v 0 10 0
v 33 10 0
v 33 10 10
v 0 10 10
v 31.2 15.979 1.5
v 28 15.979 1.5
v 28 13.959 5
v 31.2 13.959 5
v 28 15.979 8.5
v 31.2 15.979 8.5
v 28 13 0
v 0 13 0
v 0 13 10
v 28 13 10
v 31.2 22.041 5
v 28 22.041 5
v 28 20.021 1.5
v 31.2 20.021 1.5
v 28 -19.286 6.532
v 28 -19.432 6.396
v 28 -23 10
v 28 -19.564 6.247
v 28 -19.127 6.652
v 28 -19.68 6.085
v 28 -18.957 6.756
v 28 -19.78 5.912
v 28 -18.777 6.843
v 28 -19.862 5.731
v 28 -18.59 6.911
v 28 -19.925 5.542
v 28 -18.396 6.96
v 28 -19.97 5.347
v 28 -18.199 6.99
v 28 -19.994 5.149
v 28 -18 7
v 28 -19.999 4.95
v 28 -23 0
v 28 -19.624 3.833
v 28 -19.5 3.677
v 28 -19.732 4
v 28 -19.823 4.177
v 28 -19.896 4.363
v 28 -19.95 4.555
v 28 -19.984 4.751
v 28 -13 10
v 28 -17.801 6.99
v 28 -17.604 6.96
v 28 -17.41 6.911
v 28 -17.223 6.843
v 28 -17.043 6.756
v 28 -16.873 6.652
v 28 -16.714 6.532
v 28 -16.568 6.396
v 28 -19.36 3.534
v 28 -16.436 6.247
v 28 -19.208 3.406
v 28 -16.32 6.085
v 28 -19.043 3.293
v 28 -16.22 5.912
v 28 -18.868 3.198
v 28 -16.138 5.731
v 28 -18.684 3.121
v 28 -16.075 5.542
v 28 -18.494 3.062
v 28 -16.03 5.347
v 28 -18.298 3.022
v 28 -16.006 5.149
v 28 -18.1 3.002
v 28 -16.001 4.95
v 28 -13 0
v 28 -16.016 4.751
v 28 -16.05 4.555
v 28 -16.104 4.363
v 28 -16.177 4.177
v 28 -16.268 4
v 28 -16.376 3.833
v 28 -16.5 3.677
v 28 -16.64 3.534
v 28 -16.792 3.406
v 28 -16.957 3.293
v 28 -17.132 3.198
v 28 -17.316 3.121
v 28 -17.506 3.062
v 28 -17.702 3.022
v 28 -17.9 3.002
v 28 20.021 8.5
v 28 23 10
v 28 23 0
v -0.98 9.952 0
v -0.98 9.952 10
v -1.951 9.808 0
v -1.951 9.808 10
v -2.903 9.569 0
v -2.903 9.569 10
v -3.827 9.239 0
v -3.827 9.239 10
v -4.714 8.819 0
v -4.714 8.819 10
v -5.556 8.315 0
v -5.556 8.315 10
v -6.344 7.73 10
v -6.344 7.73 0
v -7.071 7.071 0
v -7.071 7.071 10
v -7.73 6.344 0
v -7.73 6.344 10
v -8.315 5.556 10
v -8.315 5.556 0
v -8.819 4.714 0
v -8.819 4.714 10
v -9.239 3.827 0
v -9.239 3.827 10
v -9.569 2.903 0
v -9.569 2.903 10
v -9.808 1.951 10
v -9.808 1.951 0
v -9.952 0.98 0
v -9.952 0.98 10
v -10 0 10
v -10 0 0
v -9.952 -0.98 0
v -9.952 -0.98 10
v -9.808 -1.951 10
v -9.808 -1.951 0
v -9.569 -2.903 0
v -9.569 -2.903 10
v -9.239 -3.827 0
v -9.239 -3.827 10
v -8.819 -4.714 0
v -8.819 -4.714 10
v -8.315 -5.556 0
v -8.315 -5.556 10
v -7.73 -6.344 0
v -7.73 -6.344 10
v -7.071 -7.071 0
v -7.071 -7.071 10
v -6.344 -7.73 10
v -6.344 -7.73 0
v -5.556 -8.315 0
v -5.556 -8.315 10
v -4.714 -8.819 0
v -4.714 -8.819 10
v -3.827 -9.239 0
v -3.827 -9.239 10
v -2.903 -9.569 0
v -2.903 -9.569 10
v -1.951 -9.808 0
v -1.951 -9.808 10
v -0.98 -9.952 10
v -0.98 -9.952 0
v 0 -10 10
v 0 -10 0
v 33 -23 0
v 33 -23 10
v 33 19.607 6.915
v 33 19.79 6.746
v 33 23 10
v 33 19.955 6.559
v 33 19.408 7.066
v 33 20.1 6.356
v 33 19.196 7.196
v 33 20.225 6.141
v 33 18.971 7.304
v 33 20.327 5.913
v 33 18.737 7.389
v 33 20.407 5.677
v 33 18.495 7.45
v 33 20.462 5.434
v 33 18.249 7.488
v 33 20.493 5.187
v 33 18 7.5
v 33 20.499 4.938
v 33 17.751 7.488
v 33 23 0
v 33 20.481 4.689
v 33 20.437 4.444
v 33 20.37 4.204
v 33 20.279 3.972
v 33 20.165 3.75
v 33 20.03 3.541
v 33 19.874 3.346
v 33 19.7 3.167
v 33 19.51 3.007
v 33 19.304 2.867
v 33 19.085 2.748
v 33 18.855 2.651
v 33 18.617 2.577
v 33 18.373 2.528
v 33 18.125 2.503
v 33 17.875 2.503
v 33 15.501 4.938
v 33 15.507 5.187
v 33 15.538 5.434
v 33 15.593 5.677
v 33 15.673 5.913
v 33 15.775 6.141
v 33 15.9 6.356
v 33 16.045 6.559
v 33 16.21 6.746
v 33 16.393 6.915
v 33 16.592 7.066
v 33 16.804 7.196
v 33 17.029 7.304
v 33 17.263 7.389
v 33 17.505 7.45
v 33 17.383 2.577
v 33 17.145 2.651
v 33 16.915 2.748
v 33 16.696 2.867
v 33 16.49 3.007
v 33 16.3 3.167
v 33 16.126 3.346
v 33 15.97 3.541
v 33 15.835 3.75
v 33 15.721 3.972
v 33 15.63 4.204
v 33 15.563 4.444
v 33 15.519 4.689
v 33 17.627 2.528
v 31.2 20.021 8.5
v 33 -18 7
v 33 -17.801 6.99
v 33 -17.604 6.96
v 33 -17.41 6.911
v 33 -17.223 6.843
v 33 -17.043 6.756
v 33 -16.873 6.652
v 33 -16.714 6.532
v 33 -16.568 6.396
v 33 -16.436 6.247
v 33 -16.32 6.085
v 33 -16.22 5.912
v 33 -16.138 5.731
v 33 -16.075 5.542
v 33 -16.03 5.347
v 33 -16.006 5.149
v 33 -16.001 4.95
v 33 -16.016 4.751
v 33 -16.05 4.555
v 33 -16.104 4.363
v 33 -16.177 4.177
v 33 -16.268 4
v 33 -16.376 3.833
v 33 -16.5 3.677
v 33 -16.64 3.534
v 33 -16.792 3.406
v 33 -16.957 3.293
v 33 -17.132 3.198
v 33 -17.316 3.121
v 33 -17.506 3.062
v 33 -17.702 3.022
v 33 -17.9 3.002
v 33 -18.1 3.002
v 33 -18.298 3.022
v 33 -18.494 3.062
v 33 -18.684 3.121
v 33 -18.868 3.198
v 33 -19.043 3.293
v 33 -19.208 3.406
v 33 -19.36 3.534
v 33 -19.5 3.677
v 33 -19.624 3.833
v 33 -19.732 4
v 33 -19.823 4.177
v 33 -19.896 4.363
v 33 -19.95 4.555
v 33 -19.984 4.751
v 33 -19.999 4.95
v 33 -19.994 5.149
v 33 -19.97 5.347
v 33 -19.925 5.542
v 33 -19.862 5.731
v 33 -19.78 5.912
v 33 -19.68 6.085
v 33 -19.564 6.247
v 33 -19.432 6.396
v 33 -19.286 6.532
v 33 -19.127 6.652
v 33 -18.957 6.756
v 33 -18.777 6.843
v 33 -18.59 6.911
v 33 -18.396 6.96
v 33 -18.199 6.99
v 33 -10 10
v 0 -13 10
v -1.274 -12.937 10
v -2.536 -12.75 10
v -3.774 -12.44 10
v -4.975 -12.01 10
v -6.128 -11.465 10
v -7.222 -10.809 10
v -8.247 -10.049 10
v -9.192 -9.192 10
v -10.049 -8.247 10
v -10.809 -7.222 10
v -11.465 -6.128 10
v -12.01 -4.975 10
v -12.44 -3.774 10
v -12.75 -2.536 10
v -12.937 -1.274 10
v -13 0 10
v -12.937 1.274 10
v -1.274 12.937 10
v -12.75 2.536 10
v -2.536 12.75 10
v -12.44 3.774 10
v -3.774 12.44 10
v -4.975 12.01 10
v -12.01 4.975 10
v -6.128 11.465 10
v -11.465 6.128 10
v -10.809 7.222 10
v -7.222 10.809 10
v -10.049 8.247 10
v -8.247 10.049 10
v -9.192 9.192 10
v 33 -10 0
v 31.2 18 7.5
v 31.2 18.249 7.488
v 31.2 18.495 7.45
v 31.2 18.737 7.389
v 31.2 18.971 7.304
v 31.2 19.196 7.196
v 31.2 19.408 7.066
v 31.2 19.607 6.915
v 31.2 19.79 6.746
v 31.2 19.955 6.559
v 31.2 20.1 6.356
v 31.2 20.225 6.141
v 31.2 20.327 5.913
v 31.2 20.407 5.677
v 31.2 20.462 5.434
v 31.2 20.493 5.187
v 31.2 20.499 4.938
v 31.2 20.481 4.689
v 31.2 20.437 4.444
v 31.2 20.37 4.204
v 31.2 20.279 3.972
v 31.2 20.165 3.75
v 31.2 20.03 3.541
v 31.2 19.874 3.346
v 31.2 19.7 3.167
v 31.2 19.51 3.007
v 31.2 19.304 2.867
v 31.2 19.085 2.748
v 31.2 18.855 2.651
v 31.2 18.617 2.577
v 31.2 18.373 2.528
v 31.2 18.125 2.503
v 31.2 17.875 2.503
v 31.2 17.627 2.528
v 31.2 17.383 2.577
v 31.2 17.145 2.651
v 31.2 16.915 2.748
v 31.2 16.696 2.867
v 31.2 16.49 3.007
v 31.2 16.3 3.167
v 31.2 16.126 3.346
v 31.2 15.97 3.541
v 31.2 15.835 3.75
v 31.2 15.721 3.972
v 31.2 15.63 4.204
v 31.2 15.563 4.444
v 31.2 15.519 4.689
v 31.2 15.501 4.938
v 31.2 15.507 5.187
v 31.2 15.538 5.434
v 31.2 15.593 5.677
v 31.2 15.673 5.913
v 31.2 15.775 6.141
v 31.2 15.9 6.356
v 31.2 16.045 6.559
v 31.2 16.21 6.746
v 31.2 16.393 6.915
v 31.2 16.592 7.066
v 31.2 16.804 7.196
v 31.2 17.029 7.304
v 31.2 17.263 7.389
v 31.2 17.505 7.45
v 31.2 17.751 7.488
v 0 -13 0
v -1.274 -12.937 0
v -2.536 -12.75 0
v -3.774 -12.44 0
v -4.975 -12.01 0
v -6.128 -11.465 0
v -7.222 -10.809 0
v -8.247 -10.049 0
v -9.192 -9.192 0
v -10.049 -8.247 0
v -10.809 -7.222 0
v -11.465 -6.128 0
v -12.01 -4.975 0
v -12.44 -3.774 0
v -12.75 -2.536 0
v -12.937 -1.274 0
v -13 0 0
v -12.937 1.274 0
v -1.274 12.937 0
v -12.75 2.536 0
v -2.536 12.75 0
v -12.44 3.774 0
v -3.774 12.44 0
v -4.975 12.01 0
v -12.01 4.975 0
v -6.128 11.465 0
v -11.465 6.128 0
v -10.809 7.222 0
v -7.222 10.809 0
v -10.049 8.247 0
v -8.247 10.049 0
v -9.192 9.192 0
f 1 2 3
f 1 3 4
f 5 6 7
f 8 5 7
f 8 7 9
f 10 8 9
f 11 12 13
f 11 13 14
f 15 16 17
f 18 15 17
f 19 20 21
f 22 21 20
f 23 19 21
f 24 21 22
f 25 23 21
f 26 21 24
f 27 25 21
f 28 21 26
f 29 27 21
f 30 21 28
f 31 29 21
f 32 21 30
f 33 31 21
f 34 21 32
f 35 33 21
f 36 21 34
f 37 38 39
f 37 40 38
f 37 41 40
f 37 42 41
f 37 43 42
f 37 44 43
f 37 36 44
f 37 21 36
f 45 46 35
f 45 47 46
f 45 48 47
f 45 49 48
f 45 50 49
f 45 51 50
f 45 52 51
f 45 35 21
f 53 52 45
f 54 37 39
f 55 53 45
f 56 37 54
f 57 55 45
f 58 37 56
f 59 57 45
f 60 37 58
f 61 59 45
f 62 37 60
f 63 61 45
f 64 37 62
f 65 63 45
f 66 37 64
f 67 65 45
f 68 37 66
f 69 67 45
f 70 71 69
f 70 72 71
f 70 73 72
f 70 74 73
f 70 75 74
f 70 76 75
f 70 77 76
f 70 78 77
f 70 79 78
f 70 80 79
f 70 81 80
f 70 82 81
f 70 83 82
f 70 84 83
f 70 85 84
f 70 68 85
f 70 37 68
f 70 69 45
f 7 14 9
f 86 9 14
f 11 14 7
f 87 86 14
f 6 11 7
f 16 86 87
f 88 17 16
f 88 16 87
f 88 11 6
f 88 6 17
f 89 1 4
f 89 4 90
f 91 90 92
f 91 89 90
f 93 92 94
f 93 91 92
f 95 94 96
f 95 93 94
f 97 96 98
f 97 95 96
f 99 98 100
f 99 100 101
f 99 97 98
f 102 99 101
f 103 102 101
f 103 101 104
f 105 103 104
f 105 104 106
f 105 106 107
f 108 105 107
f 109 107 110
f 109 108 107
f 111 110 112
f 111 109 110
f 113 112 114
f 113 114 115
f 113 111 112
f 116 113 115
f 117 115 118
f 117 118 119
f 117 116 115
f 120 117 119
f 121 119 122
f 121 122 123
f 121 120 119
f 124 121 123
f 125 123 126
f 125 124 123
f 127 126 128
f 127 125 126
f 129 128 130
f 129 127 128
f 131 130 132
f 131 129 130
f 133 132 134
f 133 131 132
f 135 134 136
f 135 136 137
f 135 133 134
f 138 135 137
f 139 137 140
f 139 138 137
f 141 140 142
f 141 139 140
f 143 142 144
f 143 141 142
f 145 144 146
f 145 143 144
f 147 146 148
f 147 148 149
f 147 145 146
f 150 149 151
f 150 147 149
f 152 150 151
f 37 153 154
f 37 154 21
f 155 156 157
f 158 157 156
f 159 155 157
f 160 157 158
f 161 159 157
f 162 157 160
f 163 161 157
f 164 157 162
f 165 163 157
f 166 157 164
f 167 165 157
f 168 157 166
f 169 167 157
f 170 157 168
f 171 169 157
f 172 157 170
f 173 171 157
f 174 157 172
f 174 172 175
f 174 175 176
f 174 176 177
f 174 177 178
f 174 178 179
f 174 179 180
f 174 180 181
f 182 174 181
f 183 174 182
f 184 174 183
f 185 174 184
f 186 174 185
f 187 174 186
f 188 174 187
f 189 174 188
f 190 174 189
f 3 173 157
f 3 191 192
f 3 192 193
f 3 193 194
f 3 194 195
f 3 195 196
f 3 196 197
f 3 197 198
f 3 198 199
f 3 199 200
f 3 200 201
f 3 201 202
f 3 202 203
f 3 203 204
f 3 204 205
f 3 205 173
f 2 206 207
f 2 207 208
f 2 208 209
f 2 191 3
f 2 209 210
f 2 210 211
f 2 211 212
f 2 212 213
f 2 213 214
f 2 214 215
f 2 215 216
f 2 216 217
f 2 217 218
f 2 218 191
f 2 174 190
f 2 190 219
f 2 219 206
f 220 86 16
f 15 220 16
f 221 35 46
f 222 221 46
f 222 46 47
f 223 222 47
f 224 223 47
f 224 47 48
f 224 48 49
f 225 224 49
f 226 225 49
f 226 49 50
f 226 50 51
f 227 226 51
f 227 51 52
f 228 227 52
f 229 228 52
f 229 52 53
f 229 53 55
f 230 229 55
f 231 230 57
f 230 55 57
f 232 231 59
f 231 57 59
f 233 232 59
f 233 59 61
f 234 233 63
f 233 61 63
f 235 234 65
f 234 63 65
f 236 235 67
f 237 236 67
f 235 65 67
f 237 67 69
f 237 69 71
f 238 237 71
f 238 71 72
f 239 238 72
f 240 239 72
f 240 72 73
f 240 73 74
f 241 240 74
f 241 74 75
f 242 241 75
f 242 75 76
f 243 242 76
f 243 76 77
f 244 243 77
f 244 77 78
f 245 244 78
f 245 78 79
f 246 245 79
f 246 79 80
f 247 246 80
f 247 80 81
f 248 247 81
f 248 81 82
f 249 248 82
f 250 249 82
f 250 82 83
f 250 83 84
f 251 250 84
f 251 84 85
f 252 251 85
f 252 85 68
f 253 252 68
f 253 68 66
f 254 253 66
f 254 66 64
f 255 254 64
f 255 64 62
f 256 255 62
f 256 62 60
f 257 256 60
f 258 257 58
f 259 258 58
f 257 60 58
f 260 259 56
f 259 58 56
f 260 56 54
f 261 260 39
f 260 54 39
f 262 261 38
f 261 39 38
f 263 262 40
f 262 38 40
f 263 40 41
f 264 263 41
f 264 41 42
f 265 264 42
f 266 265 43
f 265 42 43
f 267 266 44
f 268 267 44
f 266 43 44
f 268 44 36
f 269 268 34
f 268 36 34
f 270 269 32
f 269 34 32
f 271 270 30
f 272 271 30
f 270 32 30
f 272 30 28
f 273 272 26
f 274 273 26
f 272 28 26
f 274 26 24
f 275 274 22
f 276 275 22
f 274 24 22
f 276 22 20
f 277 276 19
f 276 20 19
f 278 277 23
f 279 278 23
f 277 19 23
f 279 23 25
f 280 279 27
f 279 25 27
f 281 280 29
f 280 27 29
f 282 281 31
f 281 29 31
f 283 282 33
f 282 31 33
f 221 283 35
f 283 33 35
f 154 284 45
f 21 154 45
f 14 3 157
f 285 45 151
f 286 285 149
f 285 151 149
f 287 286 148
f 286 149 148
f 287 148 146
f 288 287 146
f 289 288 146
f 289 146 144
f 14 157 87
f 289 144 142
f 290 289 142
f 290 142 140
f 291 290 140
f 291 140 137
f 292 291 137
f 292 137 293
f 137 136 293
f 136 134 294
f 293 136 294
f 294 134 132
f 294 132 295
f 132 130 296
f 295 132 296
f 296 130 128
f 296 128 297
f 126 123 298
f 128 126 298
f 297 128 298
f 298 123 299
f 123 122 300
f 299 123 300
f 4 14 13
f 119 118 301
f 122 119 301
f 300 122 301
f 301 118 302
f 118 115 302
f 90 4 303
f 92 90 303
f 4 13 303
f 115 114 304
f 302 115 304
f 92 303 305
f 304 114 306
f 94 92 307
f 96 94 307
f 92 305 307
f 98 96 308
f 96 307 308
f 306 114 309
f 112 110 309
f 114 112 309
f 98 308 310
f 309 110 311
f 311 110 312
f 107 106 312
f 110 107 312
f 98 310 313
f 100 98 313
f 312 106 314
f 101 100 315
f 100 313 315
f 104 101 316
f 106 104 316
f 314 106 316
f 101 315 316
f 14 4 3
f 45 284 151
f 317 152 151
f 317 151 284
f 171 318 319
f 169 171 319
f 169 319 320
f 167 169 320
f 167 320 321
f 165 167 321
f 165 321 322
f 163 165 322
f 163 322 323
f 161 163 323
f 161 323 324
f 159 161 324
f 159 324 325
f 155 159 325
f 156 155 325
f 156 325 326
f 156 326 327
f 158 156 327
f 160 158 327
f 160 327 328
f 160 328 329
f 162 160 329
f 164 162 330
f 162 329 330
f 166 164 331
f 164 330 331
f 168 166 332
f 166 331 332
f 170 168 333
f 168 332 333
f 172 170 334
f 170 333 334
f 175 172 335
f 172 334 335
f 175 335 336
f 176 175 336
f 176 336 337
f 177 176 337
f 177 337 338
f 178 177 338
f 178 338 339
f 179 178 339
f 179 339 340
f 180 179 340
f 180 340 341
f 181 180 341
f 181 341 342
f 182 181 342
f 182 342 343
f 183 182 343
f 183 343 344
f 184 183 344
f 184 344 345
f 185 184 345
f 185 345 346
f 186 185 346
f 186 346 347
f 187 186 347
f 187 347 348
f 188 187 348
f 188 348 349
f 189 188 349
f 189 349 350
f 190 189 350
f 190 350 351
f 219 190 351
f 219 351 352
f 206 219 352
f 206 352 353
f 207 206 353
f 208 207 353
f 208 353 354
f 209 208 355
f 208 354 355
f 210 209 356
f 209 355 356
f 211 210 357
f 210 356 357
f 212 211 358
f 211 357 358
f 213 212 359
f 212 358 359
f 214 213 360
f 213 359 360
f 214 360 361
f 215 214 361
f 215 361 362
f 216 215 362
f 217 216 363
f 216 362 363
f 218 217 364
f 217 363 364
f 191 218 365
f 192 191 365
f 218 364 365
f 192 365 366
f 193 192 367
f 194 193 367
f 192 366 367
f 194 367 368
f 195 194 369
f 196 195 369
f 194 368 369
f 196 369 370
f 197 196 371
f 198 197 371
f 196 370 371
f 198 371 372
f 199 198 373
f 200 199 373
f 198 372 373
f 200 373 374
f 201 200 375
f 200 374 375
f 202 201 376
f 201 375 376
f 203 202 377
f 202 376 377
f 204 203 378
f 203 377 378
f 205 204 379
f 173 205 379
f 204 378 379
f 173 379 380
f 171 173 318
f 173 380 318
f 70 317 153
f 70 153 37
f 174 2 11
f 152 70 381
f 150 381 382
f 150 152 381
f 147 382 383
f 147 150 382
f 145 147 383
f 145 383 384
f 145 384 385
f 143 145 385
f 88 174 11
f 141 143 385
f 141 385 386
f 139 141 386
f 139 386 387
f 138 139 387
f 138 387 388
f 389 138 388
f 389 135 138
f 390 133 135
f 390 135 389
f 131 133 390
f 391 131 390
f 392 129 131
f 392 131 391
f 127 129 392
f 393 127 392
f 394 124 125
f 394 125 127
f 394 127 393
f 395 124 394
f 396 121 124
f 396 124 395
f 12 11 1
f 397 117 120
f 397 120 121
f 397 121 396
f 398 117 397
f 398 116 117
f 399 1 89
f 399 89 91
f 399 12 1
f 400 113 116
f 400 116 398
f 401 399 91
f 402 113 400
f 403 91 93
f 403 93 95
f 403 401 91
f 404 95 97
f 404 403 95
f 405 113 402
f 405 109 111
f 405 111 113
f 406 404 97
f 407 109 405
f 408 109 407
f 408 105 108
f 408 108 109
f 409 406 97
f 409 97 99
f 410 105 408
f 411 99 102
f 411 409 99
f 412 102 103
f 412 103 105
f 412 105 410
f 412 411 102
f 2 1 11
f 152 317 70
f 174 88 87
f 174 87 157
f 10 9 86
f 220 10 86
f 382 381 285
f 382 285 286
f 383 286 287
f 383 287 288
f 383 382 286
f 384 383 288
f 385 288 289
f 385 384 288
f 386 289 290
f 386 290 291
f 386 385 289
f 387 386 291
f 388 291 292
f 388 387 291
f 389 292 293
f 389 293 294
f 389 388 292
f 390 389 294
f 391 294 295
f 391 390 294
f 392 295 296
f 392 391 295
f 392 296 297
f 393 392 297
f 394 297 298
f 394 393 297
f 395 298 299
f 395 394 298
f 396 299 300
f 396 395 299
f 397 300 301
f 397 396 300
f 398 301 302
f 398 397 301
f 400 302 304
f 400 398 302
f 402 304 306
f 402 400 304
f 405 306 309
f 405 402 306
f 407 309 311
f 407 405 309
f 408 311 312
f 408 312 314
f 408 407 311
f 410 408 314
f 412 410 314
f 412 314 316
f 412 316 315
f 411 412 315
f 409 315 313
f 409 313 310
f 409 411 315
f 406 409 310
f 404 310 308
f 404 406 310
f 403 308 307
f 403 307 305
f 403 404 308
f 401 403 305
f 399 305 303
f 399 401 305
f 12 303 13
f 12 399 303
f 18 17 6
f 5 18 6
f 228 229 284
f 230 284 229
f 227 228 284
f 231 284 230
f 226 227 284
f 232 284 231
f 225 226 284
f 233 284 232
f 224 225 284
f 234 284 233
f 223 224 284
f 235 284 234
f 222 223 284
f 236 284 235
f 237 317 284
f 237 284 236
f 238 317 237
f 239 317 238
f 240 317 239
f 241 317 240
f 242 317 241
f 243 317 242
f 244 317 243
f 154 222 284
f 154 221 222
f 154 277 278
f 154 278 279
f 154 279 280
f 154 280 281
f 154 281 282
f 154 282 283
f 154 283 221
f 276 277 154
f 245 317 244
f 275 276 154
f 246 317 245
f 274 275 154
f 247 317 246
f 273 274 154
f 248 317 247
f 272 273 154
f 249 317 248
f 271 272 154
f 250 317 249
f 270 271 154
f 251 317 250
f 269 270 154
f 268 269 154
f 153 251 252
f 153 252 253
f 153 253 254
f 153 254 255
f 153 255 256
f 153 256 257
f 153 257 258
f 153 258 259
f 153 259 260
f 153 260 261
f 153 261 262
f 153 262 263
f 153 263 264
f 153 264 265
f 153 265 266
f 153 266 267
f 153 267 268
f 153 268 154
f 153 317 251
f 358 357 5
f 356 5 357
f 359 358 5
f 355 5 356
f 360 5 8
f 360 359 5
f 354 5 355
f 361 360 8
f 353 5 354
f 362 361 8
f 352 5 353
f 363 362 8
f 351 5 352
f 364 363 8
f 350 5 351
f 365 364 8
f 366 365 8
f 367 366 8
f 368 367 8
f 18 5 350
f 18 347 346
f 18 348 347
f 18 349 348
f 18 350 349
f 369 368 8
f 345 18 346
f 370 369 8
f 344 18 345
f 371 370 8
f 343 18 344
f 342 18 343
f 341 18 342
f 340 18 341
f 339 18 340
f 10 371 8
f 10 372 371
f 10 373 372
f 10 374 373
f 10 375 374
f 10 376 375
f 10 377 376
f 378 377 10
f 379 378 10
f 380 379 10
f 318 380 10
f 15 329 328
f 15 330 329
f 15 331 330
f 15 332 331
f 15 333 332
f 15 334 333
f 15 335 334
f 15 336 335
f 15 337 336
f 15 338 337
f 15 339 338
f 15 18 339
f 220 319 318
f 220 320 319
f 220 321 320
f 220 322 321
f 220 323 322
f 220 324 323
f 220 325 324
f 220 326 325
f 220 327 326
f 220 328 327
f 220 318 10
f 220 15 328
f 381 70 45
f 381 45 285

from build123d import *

# Parameters (mm, degrees)
EXTRUDE_1_DEPTH     = 10
CUT_EXTRUDE_1_DEPTH = 3.2
SKETCH_3_R          = 2.5
CUT_EXTRUDE_2_DEPTH = 6
SKETCH_4_R          = 2
CUT_EXTRUDE_3_DEPTH = 6


with BuildPart() as part:
    # 草图1 → 凸台-拉伸1 (new body)
    with BuildSketch(Plane.XY):
        with BuildLine():
            Line((0, 13), (28, 13))
            Line((28, 13), (28, 23))
            Line((28, 23), (33, 23))
            Line((33, 23), (33, 10))
            Line((33, 10), (0, 10))
            ThreePointArc((0, 10), (-10, 0), (0, -10))
            Line((0, -10), (33, -10))
            Line((33, -10), (33, -23))
            Line((33, -23), (28, -23))
            Line((28, -23), (28, -13))
            Line((28, -13), (0, -13))
            ThreePointArc((0, -13), (-13, 0), (0, 13))
        make_face()
    extrude(amount=EXTRUDE_1_DEPTH)

    # 草图2 → 切除-拉伸1 (cut)
    with BuildSketch(Plane.ZY.offset(-28)):
        Polygon((8.5, 15.979274058), (8.5, 20.020725942), (5, 22.041451884), (1.5, 20.020725942), (1.5, 15.979274058), (5, 13.958548116), align=None)
    extrude(amount=-CUT_EXTRUDE_1_DEPTH, mode=Mode.SUBTRACT)

    # 草图3 → 切除-拉伸2 (cut, through all)
    with BuildSketch(Plane.ZY.offset(-28)):
        with Locations((5, 18)):
            Circle(SKETCH_3_R)
    extrude(amount=-CUT_EXTRUDE_2_DEPTH, mode=Mode.SUBTRACT)

    # 草图4 → 切除-拉伸3 (cut, through all)
    with BuildSketch(Plane.ZY.offset(-28)):
        with Locations((5, -18)):
            Circle(SKETCH_4_R)
    extrude(amount=-CUT_EXTRUDE_3_DEPTH, mode=Mode.SUBTRACT)


solid = part.part
